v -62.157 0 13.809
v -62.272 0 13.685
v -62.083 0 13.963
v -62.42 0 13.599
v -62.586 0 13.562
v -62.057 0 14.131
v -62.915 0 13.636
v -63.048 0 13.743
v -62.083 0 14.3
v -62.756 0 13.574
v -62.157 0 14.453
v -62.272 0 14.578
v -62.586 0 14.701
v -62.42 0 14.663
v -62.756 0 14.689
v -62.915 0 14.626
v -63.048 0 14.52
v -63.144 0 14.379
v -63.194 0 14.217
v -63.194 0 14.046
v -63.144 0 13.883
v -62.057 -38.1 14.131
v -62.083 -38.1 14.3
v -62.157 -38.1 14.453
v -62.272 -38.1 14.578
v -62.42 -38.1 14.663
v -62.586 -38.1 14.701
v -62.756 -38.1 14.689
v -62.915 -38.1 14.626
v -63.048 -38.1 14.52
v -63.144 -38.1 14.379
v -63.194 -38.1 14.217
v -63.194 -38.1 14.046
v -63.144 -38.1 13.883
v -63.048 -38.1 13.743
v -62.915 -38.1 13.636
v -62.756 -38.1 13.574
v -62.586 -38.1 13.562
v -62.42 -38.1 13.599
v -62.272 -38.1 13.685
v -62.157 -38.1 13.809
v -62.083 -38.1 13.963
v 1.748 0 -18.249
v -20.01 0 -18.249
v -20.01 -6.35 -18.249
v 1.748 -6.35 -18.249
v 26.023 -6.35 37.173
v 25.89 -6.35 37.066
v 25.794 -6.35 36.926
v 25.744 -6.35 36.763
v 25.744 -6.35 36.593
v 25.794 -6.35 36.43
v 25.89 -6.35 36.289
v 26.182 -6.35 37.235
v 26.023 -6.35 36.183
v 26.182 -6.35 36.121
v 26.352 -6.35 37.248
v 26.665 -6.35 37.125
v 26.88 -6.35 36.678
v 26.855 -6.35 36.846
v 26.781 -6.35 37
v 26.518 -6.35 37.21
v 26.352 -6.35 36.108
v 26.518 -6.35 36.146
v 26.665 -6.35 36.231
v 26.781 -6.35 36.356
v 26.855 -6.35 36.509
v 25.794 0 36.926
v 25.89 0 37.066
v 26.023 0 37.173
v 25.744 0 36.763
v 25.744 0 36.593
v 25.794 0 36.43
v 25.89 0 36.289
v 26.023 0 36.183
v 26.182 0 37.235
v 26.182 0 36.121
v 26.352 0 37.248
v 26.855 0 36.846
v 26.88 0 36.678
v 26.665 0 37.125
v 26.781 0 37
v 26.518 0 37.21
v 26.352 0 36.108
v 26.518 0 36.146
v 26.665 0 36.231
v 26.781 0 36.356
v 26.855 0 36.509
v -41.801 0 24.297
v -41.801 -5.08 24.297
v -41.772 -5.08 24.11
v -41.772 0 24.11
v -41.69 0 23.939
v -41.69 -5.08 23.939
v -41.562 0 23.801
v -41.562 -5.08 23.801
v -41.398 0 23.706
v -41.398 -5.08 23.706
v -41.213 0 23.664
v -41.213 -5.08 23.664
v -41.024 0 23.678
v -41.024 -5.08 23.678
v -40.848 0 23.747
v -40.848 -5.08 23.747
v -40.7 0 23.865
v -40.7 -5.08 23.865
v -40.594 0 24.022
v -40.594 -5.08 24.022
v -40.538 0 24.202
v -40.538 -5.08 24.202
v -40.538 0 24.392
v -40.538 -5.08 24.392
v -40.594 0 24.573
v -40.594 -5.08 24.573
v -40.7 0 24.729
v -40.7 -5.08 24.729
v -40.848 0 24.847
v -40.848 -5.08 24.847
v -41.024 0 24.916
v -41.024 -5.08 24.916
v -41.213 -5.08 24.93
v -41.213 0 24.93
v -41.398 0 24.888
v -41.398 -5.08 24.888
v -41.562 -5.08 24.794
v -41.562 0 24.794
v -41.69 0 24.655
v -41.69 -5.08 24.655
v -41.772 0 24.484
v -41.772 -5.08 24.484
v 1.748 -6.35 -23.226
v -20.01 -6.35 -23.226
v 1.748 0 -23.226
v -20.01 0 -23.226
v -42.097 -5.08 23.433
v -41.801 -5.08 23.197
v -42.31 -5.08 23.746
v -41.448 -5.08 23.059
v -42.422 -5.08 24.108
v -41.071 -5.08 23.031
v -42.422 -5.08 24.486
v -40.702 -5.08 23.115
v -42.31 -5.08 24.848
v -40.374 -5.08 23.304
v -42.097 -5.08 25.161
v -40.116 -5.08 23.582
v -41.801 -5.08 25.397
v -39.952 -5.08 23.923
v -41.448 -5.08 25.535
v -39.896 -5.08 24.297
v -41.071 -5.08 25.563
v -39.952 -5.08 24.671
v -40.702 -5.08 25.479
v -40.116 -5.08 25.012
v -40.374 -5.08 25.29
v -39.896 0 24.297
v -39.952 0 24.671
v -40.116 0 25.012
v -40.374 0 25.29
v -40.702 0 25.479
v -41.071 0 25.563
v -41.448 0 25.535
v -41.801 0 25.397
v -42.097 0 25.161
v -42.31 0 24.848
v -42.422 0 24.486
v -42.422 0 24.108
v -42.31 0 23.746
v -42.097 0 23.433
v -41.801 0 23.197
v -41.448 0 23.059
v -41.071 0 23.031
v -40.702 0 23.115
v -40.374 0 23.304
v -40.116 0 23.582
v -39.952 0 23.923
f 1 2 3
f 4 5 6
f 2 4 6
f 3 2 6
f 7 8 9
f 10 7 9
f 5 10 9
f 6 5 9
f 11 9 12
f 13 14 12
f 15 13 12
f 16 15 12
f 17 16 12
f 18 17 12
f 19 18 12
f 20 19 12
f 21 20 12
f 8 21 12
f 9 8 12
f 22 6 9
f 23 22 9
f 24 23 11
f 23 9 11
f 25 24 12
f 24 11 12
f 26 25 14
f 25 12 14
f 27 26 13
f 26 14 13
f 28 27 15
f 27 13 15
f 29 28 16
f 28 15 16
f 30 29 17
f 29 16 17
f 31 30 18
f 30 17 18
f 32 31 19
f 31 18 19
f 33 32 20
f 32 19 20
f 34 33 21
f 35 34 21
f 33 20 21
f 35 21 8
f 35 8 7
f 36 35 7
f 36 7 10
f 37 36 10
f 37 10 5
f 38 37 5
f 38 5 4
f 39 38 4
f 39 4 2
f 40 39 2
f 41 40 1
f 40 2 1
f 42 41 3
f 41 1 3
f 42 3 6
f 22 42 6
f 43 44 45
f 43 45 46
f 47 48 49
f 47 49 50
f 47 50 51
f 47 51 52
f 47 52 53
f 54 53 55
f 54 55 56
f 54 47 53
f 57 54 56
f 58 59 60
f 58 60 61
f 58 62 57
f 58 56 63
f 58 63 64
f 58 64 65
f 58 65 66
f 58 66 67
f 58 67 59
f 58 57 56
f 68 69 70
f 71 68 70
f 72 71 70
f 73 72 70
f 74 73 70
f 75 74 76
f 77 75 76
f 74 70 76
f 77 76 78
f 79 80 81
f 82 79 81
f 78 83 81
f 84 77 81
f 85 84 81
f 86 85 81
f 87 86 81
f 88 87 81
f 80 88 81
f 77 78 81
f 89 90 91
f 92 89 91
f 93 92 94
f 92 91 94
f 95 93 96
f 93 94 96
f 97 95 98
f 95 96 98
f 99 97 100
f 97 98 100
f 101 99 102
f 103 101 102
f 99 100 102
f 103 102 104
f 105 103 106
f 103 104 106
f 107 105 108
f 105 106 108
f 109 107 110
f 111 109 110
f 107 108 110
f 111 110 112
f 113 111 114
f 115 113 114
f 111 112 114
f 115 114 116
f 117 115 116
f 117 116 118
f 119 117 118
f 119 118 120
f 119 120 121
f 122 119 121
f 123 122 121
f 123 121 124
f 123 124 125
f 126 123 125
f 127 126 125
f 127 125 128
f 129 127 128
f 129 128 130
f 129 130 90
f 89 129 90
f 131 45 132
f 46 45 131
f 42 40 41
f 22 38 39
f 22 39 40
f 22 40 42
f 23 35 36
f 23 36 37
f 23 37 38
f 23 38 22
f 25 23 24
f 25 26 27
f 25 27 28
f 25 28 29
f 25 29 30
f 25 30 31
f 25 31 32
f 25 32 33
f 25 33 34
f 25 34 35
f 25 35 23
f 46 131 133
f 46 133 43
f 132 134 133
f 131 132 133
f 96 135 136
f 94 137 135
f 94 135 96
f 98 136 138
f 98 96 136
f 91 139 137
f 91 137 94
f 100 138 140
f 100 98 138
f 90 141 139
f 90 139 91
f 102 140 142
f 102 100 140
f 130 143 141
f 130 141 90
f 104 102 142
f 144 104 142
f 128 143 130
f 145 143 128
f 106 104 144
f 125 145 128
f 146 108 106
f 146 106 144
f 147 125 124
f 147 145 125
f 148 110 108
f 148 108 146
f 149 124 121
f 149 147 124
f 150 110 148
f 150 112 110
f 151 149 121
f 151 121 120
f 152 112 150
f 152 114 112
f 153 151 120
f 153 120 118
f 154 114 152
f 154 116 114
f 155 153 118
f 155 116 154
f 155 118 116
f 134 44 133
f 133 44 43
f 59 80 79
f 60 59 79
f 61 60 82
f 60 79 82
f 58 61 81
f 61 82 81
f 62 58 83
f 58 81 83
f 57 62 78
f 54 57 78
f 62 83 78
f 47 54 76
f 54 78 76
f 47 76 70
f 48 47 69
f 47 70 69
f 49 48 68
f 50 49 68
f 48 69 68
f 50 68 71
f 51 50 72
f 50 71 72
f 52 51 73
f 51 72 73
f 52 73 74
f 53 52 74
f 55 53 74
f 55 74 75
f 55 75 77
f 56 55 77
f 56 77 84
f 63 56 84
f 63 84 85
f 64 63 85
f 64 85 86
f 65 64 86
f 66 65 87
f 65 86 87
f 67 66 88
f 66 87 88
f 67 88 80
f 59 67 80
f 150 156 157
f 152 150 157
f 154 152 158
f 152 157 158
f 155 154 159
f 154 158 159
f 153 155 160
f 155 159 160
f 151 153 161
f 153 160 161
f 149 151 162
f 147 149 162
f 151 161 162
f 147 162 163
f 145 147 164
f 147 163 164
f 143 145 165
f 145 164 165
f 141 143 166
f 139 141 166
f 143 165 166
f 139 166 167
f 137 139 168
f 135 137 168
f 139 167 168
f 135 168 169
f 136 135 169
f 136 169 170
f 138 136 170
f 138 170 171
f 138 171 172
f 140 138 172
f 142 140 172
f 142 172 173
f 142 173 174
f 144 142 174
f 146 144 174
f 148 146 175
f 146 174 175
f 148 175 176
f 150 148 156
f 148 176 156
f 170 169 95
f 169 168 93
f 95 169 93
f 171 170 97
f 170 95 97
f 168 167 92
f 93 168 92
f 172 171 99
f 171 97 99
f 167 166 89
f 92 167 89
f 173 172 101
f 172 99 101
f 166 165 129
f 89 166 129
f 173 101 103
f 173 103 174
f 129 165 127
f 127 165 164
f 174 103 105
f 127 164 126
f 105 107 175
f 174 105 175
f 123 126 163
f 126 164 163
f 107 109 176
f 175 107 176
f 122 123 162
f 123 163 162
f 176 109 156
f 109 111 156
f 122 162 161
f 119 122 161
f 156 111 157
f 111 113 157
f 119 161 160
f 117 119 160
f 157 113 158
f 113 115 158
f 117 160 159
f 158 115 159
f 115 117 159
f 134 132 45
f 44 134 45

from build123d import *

# Parameters (mm, degrees)
F0_R     = 1.27
F1_DEPTH = 5.08
F2_D     = 1.27
F3_W     = 21.75764
F3_H     = 4.9772378749
F4_DEPTH = 6.35
F5_R     = 0.5715
F6_DEPTH = 38.1
F7_R     = 0.5715
F8_DEPTH = 6.35


with BuildPart() as f1:
    # F0 (on Front) → F1 (new body)
    with BuildSketch(Plane.XZ):
        with Locations((-41.1656871438, 24.2970418185)):
            Circle(F0_R)
    extrude(amount=F1_DEPTH)

    # F2 (through all)
    with Locations(Plane(origin=(0, 0, 0), x_dir=(1, 0, 0), z_dir=(0, 1, 0))):
        with Locations((-41.1656871438, -24.2970418185)):
            Hole(F2_D / 2)


with BuildPart() as f4:
    # F3 (on Front) → F4 (new body)
    with BuildSketch(Plane.XZ):
        with Locations((-9.1307358816, -20.7376023754)):
            Rectangle(F3_W, F3_H)
    extrude(amount=F4_DEPTH)


with BuildPart() as f6:
    # F5 (on Front) → F6 (new body)
    with BuildSketch(Plane.XZ):
        with Locations((-62.6288205385, 14.1314091161)):
            Circle(F5_R)
    extrude(amount=F6_DEPTH)


with BuildPart() as f8:
    # F7 (on Front) → F8 (new body)
    with BuildSketch(Plane.XZ):
        with Locations((26.3088960201, 36.6776995361)):
            Circle(F7_R)
    extrude(amount=F8_DEPTH)


solid = Compound([f1.part, f4.part, f6.part, f8.part])
